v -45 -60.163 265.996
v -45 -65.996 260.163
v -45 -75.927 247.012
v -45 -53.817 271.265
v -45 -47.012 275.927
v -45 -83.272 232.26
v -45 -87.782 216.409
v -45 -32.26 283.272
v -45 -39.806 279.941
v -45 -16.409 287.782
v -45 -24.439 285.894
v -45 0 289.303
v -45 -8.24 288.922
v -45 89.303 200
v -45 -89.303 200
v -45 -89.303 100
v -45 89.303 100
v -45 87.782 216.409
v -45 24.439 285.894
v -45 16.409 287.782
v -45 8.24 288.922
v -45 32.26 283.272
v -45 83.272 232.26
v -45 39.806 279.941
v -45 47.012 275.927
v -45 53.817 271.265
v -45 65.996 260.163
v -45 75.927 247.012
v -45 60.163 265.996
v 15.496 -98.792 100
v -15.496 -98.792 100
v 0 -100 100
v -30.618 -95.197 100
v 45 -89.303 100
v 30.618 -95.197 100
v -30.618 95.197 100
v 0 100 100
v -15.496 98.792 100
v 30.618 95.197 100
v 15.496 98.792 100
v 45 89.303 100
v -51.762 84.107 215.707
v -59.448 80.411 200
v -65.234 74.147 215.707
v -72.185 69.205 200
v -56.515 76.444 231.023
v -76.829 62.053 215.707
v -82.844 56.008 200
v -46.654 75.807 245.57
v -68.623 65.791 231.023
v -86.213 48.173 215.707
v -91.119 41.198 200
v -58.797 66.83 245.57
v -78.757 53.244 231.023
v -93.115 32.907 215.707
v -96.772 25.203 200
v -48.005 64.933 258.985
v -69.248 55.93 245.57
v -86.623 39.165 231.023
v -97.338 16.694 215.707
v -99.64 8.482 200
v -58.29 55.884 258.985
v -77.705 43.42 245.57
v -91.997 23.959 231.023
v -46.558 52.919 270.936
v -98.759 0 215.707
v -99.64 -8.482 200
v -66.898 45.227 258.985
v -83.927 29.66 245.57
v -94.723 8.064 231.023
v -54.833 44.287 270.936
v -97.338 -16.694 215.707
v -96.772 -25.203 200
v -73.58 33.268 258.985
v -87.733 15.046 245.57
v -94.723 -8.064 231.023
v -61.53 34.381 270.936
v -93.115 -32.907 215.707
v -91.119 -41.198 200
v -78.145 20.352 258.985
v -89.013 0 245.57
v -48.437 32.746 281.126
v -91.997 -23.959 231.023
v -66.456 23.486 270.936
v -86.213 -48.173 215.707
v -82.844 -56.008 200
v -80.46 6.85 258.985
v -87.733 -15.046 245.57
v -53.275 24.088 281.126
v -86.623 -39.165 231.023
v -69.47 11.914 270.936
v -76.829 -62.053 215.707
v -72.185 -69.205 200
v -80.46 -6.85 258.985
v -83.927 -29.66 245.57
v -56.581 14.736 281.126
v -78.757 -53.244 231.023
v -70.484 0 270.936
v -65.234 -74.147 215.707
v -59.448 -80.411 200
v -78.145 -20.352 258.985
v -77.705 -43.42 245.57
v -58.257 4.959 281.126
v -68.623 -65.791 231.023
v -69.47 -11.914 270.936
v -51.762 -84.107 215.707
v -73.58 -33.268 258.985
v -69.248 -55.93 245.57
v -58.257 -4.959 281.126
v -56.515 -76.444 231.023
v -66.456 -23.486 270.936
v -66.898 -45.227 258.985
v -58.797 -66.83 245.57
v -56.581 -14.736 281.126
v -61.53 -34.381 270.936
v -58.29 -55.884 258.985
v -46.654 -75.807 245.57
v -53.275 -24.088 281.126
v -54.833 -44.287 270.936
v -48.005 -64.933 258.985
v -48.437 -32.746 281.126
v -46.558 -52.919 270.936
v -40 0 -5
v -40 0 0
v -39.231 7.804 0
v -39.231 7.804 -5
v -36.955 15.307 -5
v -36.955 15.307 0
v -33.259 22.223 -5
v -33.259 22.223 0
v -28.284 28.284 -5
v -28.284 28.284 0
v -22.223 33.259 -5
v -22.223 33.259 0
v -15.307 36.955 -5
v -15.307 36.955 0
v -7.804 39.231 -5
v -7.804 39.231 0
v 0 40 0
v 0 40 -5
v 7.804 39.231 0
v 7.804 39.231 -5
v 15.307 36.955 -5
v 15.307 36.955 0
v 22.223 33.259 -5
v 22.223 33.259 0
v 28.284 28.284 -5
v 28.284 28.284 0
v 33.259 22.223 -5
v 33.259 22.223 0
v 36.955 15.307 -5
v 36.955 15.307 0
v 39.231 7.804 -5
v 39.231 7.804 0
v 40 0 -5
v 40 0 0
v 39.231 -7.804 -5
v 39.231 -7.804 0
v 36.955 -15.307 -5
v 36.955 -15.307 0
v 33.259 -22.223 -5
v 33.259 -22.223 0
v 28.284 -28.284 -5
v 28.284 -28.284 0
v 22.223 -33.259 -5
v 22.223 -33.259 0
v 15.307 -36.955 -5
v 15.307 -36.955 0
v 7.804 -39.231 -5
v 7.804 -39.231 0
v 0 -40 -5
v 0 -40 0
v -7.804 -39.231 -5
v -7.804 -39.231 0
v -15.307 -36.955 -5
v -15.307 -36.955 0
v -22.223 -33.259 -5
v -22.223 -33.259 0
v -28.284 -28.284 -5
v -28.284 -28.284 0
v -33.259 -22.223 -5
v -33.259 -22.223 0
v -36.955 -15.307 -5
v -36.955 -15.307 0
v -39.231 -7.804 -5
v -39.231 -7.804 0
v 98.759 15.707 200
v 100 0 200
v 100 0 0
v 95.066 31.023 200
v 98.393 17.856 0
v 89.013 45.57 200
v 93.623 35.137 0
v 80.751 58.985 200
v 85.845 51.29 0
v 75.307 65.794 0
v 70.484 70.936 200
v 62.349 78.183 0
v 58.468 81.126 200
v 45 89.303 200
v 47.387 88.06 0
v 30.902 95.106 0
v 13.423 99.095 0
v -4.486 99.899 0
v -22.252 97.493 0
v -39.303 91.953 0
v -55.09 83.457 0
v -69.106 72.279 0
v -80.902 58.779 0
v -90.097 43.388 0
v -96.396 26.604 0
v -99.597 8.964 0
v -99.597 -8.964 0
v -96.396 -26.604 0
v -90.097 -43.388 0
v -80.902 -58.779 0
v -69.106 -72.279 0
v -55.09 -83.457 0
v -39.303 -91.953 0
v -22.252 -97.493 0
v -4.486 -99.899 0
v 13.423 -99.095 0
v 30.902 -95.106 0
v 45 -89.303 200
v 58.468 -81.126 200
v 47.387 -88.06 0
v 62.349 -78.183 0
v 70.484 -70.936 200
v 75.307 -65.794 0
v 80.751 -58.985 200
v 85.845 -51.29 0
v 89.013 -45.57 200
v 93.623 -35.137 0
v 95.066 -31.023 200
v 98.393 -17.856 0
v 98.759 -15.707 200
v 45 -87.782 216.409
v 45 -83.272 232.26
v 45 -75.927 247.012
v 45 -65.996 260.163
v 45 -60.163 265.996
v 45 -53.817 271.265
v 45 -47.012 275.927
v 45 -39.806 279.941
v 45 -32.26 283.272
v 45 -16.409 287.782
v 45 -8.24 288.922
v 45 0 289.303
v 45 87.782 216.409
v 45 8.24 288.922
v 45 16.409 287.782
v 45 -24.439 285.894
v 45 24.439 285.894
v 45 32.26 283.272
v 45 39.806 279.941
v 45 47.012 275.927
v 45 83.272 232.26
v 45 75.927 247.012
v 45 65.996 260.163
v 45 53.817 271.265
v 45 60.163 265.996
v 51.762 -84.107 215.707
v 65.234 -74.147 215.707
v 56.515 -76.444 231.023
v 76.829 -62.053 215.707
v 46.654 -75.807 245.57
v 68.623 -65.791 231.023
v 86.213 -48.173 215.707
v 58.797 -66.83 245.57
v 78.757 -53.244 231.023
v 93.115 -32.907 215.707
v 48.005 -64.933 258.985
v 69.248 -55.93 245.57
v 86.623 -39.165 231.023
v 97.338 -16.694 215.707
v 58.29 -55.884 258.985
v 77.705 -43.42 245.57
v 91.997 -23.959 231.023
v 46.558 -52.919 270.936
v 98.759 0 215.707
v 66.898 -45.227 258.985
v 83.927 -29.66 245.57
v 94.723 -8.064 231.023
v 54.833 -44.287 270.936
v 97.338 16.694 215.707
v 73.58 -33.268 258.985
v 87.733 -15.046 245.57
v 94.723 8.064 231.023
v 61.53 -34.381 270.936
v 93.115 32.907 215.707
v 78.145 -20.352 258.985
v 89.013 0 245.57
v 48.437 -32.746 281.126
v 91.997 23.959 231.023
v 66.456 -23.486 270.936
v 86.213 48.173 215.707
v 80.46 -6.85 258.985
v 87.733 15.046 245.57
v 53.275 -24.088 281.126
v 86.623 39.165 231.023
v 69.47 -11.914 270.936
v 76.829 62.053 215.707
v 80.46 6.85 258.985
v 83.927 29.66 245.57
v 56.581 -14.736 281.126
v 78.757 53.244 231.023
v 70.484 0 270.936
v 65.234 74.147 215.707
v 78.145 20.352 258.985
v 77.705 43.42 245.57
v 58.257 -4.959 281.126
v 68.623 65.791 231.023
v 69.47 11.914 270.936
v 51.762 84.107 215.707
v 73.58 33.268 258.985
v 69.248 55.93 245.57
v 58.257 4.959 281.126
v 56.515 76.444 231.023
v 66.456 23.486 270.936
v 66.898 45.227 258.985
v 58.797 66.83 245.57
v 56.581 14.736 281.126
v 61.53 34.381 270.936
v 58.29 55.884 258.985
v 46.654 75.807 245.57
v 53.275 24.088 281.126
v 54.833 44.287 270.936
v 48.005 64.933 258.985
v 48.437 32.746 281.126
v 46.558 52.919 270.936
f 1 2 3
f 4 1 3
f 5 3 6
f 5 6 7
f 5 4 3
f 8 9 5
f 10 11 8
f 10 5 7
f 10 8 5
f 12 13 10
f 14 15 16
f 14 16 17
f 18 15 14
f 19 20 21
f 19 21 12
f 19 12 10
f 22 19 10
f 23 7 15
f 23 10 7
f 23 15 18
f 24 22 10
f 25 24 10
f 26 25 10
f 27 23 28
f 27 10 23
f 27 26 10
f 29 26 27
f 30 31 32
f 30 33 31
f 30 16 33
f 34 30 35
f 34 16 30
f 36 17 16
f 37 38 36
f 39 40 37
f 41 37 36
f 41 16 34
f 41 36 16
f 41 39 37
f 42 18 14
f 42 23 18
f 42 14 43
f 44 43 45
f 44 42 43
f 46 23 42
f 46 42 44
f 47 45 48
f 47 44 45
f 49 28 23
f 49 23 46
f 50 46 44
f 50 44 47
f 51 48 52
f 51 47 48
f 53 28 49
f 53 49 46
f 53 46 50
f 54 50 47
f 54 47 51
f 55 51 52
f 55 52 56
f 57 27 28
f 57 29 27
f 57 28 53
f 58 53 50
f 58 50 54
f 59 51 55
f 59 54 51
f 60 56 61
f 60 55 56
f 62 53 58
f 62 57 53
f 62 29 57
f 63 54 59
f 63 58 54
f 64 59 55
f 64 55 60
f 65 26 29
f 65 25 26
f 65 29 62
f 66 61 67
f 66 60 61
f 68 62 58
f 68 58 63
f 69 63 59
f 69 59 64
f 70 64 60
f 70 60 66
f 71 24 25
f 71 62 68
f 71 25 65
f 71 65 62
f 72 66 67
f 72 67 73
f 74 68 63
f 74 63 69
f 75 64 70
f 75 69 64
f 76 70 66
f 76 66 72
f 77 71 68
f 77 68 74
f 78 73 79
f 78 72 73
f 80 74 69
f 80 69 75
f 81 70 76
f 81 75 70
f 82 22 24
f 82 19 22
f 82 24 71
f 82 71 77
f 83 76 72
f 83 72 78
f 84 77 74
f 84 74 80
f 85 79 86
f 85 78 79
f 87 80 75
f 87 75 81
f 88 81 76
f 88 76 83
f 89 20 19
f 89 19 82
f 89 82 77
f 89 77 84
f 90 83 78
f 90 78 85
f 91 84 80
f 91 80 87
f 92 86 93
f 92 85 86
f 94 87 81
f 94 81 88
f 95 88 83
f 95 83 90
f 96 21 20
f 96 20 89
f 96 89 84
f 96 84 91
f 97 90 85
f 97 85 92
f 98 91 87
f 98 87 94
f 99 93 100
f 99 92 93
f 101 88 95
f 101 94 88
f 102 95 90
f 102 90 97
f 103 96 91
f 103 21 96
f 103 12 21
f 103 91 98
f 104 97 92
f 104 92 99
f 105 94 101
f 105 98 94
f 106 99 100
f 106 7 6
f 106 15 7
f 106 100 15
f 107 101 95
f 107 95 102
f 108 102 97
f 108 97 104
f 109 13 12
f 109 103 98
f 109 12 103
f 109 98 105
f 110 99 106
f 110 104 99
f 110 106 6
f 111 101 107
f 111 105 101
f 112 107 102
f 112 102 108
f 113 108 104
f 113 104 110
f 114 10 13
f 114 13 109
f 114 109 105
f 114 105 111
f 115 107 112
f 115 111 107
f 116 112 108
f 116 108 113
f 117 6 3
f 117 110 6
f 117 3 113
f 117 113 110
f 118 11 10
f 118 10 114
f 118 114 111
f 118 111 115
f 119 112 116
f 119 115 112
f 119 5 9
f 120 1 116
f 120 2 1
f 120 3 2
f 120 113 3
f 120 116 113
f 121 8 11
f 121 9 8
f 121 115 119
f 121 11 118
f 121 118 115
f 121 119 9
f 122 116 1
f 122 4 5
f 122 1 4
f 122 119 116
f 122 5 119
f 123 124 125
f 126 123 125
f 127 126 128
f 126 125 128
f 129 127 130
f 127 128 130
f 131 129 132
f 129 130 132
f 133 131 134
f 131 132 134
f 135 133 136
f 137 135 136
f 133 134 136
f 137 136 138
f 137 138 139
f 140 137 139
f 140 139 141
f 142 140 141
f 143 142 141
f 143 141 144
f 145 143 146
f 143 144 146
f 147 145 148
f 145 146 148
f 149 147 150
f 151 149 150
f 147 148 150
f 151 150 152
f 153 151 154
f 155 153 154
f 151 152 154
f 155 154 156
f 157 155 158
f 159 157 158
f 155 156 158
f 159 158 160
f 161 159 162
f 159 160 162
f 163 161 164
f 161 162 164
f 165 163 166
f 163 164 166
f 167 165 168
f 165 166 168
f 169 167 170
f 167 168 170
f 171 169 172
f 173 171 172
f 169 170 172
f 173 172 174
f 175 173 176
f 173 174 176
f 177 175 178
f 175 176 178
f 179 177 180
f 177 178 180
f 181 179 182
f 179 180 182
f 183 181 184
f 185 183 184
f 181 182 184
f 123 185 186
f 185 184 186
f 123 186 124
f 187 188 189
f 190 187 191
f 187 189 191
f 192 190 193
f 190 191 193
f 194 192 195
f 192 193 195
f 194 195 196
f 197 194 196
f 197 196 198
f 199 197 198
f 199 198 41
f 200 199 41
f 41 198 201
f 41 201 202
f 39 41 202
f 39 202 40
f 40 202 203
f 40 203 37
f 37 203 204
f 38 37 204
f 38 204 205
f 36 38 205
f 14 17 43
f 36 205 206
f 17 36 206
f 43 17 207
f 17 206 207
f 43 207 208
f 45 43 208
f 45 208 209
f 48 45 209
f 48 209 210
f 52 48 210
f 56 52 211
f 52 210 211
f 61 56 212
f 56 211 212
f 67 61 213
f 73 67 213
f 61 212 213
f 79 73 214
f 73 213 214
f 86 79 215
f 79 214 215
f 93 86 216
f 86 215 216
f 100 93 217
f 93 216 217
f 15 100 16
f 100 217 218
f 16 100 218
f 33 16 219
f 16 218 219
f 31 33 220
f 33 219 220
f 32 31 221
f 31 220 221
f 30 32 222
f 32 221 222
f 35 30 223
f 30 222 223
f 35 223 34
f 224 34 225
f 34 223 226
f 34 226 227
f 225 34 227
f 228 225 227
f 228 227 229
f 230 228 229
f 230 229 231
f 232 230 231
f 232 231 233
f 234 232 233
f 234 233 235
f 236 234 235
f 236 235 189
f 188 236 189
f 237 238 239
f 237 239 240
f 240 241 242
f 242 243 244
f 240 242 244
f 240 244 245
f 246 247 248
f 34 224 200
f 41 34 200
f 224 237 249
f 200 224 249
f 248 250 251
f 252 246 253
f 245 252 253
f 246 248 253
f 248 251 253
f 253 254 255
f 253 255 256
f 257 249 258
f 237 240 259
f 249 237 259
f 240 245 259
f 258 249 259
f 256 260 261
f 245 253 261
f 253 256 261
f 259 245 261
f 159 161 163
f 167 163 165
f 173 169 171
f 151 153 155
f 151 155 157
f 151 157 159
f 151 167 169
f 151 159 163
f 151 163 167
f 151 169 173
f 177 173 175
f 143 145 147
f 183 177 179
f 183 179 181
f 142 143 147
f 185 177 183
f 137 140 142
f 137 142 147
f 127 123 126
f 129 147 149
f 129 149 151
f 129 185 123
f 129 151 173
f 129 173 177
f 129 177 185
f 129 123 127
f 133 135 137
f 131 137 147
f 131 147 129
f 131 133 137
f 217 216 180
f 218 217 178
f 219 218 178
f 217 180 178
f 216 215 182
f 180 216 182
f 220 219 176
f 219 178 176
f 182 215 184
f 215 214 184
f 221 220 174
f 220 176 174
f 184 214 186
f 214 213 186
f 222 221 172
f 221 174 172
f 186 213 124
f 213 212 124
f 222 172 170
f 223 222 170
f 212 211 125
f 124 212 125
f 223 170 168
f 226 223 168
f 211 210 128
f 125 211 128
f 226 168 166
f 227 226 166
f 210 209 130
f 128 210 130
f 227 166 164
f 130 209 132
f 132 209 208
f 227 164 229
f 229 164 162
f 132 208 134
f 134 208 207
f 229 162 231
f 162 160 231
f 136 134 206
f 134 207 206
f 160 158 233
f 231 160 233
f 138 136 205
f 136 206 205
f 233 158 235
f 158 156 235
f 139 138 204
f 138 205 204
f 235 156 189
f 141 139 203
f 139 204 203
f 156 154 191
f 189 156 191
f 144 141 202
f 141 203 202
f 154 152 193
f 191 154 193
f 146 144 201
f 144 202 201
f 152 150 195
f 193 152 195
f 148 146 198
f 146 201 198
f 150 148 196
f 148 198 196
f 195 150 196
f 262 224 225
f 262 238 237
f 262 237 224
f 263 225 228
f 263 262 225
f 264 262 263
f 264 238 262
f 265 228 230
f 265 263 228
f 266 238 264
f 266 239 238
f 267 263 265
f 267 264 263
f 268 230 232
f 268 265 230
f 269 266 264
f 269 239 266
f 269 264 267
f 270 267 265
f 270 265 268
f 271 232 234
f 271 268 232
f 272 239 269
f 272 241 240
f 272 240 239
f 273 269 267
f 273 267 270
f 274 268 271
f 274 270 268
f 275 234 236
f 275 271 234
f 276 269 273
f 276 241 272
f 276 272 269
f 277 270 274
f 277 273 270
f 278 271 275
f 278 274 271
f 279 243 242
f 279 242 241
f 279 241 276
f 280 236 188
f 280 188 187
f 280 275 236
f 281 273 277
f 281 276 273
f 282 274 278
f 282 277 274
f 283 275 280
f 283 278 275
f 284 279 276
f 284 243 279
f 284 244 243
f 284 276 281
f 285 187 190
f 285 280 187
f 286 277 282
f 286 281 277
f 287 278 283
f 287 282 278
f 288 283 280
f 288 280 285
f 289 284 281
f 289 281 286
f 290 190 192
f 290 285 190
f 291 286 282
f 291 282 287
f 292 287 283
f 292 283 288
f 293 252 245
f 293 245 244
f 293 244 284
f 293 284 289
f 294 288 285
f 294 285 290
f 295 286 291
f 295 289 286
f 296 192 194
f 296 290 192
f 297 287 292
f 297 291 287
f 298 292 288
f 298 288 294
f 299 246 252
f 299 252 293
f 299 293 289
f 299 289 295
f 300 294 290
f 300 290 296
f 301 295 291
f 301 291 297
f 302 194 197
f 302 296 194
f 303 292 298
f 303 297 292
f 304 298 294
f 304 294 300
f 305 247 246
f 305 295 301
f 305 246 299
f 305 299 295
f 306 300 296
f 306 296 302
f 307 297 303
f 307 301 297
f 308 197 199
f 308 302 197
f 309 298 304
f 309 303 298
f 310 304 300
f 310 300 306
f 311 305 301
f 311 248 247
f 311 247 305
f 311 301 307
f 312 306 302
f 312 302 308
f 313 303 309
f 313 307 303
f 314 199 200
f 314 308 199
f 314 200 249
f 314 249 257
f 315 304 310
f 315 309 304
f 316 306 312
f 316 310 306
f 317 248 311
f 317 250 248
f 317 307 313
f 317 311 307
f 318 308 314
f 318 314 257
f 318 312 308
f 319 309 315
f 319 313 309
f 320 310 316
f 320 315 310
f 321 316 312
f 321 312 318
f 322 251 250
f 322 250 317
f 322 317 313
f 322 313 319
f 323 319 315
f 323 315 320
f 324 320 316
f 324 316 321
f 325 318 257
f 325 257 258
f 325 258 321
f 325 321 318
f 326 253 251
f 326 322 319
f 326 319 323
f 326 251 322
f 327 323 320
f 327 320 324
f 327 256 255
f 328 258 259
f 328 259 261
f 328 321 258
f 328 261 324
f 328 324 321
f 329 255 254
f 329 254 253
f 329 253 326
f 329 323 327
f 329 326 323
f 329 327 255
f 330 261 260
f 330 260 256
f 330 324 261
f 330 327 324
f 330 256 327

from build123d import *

# Parameters (mm, degrees)
SKETCH1_R           = 100
BOSS_EXTRUDE2_DEPTH = 200
DOME1_FACE_RADIUS   = 100
DOME1_HEIGHT        = 100
SKETCH3_W           = 90
SKETCH3_H           = 221.081096798
CUT_EXTRUDE1_DEPTH  = 200
SKETCH4_R           = 40
BOSS_EXTRUDE3_DEPTH = 5


with BuildPart() as part:
    # Sketch1 → Boss-Extrude2 (new body)
    with BuildSketch(Plane.XY):
        Circle(SKETCH1_R)
    extrude(amount=BOSS_EXTRUDE2_DEPTH)

    # Dome1: a dome of height H over a round flat face of radius A is a cap of a sphere of radius (A * A + H * H) / (2 * H)
    dome1_r = (DOME1_FACE_RADIUS * DOME1_FACE_RADIUS + DOME1_HEIGHT * DOME1_HEIGHT) / (2 * DOME1_HEIGHT)
    dome1_base = Plane((0, 0, 200), z_dir=(0, 0, 1))
    with Locations(dome1_base.offset(DOME1_HEIGHT - dome1_r)):
        dome1_ball = Sphere(dome1_r, mode=Mode.PRIVATE)
    add(split(dome1_ball, bisect_by=dome1_base, keep=Keep.TOP, mode=Mode.PRIVATE))

    # Sketch3 → Cut-Extrude1 (cut)
    with BuildSketch(Plane.XY.offset(300)):
        Rectangle(SKETCH3_W, SKETCH3_H)
    extrude(amount=-CUT_EXTRUDE1_DEPTH, mode=Mode.SUBTRACT)

    # Sketch4 → Boss-Extrude3 (add)
    with BuildSketch(Plane(origin=(0, 0, 0), x_dir=(-1, 0, 0), z_dir=(0, 0, -1))):
        Circle(SKETCH4_R)
    extrude(amount=BOSS_EXTRUDE3_DEPTH)


solid = part.part
